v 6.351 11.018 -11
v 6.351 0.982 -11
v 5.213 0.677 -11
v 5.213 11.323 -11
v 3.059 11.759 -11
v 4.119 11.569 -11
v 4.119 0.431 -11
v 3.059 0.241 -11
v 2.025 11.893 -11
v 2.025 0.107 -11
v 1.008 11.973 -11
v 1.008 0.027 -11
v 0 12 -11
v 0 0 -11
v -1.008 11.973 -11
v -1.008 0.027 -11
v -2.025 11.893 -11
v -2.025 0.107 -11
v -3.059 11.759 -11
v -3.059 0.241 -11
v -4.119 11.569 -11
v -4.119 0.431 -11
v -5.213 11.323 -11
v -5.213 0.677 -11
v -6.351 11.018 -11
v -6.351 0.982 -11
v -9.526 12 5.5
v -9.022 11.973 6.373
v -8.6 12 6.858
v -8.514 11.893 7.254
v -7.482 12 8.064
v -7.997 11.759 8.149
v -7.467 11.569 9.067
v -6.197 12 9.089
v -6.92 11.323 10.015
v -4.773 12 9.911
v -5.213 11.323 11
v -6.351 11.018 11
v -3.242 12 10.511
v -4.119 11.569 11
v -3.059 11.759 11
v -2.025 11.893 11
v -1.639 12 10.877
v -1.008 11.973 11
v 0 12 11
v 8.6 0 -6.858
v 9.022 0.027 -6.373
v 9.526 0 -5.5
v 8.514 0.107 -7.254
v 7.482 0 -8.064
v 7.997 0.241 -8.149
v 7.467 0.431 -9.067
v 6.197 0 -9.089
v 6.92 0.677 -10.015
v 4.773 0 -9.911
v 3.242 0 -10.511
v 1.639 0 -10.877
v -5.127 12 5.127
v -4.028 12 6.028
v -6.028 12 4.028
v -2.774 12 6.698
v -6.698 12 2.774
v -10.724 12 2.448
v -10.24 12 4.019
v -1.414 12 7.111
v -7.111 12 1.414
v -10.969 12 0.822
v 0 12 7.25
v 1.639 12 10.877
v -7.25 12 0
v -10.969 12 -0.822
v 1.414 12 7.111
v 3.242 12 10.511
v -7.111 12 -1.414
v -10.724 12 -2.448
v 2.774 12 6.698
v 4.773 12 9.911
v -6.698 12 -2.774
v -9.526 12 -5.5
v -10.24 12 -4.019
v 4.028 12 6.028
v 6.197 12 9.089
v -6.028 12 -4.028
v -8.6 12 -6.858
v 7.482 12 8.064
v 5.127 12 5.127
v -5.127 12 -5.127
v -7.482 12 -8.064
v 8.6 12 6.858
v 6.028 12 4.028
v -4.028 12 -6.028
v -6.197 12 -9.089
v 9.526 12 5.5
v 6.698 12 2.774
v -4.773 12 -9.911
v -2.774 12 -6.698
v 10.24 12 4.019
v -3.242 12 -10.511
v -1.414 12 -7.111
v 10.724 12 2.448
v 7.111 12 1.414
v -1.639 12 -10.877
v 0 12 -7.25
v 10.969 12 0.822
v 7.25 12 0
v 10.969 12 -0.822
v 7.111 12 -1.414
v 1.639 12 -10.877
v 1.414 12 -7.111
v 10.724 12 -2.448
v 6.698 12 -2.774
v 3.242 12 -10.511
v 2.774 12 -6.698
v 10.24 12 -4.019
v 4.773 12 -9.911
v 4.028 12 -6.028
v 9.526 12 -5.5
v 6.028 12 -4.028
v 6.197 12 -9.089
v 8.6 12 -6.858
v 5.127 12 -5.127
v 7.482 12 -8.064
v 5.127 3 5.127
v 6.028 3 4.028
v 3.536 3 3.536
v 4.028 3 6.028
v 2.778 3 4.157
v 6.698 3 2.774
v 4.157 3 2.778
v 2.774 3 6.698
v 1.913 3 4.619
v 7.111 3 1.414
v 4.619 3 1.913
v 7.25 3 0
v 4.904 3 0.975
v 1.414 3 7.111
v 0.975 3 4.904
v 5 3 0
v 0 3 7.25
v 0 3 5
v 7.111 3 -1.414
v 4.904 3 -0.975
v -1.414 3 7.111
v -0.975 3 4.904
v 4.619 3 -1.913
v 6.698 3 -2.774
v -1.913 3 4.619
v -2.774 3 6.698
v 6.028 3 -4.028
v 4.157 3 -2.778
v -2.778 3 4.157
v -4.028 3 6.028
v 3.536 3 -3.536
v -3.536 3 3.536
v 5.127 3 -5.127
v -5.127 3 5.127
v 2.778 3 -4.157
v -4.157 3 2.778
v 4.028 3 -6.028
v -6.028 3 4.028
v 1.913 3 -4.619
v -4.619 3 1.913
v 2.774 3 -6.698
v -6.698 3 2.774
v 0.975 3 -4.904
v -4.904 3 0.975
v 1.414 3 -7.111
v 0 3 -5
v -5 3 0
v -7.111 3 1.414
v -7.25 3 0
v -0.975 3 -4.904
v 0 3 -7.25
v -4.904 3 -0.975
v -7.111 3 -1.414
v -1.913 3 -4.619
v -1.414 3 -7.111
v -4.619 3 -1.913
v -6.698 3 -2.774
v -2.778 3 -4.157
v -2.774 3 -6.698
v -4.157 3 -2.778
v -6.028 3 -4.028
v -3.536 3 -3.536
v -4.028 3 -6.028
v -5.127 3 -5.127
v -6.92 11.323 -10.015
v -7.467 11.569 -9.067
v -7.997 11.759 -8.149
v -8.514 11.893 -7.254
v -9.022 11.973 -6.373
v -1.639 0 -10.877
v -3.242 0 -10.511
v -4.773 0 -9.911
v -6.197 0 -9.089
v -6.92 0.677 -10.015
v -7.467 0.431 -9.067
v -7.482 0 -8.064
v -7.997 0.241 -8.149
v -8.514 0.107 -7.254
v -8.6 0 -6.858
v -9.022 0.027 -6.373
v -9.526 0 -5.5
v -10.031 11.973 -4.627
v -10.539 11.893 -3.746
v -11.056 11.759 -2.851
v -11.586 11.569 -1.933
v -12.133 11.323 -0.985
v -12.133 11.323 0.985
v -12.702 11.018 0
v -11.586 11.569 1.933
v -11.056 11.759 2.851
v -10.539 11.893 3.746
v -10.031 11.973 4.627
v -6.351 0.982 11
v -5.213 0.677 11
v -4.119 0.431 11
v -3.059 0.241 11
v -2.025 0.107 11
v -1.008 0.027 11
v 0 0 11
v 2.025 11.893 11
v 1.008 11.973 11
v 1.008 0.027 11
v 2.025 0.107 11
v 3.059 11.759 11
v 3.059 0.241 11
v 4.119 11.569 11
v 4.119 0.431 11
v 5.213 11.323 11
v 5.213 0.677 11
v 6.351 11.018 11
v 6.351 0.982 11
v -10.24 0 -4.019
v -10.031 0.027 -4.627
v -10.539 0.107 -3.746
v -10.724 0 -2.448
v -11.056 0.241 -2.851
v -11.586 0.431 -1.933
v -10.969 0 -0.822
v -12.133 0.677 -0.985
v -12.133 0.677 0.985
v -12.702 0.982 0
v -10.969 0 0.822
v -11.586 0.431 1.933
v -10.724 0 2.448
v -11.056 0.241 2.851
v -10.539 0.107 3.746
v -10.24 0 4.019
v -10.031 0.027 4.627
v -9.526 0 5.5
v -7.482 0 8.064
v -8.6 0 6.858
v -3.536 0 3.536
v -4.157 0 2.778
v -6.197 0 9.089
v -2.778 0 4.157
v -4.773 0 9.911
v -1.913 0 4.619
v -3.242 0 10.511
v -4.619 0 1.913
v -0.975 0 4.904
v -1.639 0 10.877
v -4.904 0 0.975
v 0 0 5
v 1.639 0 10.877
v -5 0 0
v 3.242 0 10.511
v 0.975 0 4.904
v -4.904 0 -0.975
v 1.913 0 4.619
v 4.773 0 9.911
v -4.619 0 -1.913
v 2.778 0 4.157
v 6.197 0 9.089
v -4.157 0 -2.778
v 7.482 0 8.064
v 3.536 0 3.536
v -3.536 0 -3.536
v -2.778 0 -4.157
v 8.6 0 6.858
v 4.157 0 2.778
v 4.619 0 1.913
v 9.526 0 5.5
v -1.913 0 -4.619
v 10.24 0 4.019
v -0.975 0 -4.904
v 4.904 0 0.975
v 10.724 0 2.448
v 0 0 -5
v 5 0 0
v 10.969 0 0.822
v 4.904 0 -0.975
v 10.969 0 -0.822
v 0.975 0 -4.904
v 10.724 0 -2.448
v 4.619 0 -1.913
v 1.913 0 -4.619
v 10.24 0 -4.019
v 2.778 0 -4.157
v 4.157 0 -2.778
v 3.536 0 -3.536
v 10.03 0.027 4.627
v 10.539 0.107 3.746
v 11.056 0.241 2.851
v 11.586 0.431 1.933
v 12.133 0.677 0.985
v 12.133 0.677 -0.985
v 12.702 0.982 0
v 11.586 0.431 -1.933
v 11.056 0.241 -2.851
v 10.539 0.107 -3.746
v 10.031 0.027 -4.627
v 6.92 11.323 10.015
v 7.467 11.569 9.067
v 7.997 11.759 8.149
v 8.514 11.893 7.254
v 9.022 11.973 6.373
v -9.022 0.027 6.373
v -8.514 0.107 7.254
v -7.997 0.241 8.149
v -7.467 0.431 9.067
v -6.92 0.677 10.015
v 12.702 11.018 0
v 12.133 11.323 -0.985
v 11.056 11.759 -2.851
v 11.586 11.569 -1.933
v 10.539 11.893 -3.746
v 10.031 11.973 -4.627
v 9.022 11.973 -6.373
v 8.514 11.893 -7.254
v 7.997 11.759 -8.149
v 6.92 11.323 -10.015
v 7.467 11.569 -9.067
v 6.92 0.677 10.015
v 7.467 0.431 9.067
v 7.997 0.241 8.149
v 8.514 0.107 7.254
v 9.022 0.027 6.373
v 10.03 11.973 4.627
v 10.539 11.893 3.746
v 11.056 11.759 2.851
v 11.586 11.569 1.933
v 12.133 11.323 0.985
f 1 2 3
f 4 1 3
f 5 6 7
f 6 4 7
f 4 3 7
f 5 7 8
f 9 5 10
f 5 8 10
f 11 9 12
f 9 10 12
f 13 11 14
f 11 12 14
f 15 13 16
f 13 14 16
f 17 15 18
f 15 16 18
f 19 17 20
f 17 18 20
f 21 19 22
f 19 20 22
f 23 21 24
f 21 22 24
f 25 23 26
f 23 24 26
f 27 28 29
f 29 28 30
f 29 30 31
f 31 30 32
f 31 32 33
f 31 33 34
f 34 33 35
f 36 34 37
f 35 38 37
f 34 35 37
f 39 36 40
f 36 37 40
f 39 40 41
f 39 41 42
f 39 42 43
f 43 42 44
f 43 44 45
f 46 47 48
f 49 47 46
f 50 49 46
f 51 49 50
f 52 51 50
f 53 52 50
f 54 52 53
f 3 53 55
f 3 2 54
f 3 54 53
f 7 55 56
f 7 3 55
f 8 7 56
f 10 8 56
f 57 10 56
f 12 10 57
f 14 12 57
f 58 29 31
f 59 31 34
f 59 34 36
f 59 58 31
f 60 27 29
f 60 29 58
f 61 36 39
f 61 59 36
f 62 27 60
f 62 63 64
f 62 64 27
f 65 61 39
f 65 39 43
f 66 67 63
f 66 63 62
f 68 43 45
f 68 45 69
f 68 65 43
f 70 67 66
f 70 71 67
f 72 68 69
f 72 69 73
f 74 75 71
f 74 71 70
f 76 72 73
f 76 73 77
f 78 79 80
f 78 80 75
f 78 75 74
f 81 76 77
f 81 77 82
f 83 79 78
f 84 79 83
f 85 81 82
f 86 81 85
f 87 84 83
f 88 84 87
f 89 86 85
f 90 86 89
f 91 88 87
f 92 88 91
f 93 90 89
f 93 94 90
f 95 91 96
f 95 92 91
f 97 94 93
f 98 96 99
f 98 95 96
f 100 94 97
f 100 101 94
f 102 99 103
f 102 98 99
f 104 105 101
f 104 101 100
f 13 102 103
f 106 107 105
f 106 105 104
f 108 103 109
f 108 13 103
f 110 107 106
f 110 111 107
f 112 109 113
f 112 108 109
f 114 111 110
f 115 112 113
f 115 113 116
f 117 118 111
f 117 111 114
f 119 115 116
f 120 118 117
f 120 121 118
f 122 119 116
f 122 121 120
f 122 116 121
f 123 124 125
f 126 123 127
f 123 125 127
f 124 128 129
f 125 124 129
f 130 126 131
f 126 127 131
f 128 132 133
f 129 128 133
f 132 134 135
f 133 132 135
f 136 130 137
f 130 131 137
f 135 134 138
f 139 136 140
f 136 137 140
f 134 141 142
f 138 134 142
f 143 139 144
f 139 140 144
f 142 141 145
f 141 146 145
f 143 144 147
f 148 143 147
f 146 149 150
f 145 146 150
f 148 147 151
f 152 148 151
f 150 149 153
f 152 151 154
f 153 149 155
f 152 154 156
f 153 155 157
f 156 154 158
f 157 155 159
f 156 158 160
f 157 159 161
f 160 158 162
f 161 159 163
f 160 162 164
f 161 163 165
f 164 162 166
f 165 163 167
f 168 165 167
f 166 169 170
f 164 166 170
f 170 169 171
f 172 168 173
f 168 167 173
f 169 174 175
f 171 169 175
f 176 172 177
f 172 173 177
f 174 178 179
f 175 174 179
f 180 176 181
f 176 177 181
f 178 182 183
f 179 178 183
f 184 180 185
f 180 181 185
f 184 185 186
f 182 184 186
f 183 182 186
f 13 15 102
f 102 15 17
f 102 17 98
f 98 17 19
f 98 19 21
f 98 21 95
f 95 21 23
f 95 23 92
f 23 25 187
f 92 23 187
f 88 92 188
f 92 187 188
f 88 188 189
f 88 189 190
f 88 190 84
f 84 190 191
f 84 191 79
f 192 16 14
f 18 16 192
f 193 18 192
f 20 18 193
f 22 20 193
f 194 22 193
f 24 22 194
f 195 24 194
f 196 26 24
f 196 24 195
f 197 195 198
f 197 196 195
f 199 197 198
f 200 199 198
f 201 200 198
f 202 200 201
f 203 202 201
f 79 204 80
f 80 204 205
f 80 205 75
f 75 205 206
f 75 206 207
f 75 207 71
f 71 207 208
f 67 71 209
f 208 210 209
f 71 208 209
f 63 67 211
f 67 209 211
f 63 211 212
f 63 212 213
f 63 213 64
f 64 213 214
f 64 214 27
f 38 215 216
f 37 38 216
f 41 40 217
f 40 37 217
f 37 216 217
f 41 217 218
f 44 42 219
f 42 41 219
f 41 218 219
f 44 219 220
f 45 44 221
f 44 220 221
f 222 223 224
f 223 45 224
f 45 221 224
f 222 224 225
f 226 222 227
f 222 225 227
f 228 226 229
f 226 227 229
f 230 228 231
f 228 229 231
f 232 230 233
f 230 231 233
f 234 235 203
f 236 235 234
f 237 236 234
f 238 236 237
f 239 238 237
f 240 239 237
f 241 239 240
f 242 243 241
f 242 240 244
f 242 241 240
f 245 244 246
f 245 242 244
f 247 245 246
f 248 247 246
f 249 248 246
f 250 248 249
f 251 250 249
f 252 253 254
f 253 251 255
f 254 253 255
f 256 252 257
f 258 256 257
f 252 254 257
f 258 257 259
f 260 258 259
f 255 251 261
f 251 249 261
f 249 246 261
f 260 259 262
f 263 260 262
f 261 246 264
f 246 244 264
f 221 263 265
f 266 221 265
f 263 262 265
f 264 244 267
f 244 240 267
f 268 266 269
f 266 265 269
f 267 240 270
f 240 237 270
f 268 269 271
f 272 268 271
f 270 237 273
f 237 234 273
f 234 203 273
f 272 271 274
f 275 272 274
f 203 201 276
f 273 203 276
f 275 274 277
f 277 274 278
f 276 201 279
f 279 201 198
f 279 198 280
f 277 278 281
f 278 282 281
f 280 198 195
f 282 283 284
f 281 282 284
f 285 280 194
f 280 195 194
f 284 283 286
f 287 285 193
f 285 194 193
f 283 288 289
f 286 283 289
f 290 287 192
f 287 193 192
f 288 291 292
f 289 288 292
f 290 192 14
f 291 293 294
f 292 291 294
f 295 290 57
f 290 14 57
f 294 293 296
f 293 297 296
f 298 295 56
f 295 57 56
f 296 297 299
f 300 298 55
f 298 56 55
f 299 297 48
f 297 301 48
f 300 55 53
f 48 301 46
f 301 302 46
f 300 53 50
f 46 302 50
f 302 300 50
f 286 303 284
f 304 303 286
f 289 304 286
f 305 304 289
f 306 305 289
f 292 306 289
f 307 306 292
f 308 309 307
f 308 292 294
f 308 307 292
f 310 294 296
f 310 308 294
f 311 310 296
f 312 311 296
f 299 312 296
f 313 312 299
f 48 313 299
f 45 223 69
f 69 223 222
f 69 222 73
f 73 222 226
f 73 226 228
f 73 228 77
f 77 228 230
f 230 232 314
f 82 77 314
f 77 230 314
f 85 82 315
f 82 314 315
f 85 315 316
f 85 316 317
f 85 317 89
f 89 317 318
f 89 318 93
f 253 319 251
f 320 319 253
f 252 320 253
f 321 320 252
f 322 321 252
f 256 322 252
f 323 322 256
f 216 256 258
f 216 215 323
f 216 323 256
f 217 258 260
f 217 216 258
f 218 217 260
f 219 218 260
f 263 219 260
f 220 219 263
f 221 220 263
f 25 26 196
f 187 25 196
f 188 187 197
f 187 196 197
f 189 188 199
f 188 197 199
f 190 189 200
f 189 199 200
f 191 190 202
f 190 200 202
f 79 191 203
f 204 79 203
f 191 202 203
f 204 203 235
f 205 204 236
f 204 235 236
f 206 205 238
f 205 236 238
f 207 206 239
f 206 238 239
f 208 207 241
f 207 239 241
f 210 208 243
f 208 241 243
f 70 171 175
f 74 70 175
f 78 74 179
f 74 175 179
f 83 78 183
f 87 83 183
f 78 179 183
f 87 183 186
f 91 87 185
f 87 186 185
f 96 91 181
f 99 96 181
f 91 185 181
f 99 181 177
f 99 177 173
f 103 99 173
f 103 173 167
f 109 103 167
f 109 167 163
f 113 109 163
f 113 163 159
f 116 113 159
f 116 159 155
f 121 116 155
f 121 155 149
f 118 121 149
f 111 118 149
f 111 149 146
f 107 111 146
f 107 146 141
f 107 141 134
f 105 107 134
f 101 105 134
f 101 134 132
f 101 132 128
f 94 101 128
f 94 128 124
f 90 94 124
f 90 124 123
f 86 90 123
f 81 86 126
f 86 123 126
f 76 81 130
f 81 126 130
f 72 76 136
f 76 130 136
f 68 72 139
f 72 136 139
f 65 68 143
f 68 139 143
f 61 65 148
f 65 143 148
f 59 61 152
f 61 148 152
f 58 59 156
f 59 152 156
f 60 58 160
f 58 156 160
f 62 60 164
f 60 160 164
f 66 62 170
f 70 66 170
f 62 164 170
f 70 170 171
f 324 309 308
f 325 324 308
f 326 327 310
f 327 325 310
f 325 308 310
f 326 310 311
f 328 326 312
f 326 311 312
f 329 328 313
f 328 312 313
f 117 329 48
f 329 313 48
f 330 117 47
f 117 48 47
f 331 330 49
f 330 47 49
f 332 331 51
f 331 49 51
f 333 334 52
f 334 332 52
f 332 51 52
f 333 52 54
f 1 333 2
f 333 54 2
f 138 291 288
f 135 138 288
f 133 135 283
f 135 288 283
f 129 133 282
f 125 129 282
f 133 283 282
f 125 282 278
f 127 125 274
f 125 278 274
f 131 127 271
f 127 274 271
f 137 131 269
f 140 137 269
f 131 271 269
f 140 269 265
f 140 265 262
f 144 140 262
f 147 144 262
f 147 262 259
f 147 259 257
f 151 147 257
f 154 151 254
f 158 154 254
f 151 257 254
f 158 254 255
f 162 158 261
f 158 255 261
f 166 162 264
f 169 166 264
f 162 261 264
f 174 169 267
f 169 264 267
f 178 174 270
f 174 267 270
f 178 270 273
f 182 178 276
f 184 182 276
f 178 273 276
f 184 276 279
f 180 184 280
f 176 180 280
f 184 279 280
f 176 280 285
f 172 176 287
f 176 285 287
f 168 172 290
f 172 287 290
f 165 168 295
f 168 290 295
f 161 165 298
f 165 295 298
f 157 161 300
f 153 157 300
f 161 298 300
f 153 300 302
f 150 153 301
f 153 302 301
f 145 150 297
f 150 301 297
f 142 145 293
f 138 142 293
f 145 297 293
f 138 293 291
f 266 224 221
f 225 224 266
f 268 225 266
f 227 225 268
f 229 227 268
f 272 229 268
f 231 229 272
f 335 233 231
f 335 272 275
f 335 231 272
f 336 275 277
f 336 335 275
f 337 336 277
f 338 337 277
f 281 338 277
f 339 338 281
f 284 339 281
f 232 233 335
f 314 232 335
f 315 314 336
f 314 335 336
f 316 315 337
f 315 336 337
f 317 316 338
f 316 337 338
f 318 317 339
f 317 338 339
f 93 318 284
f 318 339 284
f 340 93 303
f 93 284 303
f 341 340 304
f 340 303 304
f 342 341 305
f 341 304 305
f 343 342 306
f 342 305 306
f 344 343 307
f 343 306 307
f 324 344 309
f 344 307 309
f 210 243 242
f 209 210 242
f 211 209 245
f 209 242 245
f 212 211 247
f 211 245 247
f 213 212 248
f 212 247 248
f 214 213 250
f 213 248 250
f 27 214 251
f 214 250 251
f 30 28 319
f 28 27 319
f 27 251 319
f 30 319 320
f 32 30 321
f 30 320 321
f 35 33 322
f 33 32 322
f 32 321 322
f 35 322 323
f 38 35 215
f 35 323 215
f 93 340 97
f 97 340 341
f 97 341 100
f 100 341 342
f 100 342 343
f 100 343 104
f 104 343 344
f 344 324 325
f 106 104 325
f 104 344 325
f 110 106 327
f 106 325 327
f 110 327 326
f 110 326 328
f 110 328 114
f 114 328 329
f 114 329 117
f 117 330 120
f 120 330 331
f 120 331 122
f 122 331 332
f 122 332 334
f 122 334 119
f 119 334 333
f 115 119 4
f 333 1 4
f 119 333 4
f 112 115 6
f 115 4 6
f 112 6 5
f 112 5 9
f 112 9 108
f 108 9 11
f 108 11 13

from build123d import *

# Parameters (mm, degrees)
AUFSATZ_LINEAR_AUSTRAGEN1_DEPTH = 12
SKIZZE2_R                       = 5
SCHNITT_LINEAR_AUSTRAGEN1_DEPTH = 3
M16X1_5_GEWINDEBOHRUNG1_D       = 14.5
M16X1_5_GEWINDEBOHRUNG1_DEPTH   = 9


with BuildPart() as part:
    # Skizze1 → Aufsatz-Linear austragen1 (new body)
    with BuildSketch(Plane(origin=(0, 0, 0), x_dir=(1, 0, 0), z_dir=(0, 1, 0))):
        Polygon((12.701705922, 0), (6.350852961, 11), (-6.350852961, 11), (-12.701705922, 0), (-6.350852961, -11), (6.350852961, -11), align=None)
    extrude(amount=AUFSATZ_LINEAR_AUSTRAGEN1_DEPTH)

    # Skizze2 → Schnitt-Linear austragen1 (cut)
    with BuildSketch(Plane.XZ):
        Circle(SKIZZE2_R)
    extrude(amount=-SCHNITT_LINEAR_AUSTRAGEN1_DEPTH, mode=Mode.SUBTRACT)

    # M16x1.5 Gewindebohrung1
    with Locations(Plane(origin=(0, 12, 0), x_dir=(1, 0, 0), z_dir=(0, 1, 0))):
        with Locations((0, 0)):
            Hole(M16X1_5_GEWINDEBOHRUNG1_D / 2, depth=M16X1_5_GEWINDEBOHRUNG1_DEPTH)

    # Skizze5 → Schnitt-Rotation1 (revolve, cut)
    with BuildSketch(Plane.XY):
        Polygon((-12.701705922, 12), (-11, 12), (-12.701705922, 11.017519628), align=None)
        Polygon((-12.701705922, 0), (-11, 0), (-12.701705922, 0.982480372), align=None)
    revolve(axis=Axis((0, 0, 0), (0, 1, 0)), mode=Mode.SUBTRACT)


solid = part.part
